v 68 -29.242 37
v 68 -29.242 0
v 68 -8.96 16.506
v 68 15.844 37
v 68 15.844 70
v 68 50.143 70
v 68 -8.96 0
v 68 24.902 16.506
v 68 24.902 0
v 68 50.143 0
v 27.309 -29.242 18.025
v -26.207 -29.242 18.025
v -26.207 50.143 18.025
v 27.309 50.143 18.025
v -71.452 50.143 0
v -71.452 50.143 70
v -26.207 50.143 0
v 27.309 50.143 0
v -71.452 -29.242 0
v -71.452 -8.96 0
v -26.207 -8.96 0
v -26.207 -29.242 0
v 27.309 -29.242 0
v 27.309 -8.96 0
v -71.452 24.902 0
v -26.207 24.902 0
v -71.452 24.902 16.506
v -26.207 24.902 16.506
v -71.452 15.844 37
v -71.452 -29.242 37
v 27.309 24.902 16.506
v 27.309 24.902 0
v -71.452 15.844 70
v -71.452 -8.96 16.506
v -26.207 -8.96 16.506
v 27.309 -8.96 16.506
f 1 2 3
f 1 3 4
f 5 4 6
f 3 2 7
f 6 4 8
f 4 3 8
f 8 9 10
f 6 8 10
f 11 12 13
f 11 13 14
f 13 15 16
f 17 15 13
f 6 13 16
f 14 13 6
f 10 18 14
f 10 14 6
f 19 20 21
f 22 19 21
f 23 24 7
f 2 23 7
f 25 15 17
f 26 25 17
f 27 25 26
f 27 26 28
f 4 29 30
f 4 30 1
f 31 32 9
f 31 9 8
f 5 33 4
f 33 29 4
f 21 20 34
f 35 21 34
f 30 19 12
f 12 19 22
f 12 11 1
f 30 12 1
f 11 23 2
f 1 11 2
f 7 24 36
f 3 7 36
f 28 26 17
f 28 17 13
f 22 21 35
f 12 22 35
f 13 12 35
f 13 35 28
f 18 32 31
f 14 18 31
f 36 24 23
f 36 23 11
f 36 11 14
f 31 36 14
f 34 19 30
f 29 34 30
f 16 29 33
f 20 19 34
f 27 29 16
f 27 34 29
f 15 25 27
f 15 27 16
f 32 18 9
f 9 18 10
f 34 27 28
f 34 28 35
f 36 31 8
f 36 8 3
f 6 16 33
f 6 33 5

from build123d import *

# Parameters (mm, degrees)
F0_W      = 139.4520141184
F0_H      = 104.3851450086
F1_DEPTH  = 10
F2_W      = 139.4520141184
F2_H      = 34.2989321798
F3_DEPTH  = 50
F4_DEPTH  = 27
F5_DEPTH  = 10
F6_DEPTH  = 25
F7_W      = 53.5153914243
F7_H      = 18.0249847472
F8_DEPTH  = 81
F9_W      = 33.8615532964
F9_H      = 16.5060851723
F10_DEPTH = 258


with BuildPart() as f1:
    # F0 (on Top) → F1 (new body)
    with BuildSketch(Plane.XY):
        with Locations((-1.7260108143, -2.0494647324)):
            Rectangle(F0_W, F0_H)
    extrude(amount=F1_DEPTH)

    # F2 (on face) → F3 (join)
    with BuildSketch(Plane.XY.offset(10)):
        with Locations((-1.7260108143, 32.993641682)):
            Rectangle(F2_W, F2_H)
    extrude(amount=F3_DEPTH)

    # F4 (add): a face of the model
    f4_faces = [f1.faces().sort_by_distance(p)[0] for p in [
        (-1.7260108143, -19.1989308223, 10),
    ]]
    extrude(f4_faces, amount=F4_DEPTH)

    # F5 (add): a face of the model
    f5_faces = [f1.faces().sort_by_distance(p)[0] for p in [
        (-1.7260108143, 32.993641682, 60),
    ]]
    extrude(f5_faces, amount=F5_DEPTH)

    # F6 (cut): a face of the model
    f6_faces = [f1.faces().sort_by_distance(p)[0] for p in [
        (-1.7260108143, -54.2420372367, 18.5),
    ]]
    extrude(f6_faces, amount=-F6_DEPTH, mode=Mode.SUBTRACT)

    # F7 (on face) → F8 (cut)
    with BuildSketch(Plane.XZ.offset(29.2420372367)):
        with Locations((0.5511036143, 9.0124923736)):
            Rectangle(F7_W, F7_H)
    extrude(amount=-F8_DEPTH, mode=Mode.SUBTRACT)

    # F9 (on face) → F10 (cut)
    with BuildSketch(Plane(origin=(-71.4520178735, 0, 0), x_dir=(0, -1, 0), z_dir=(-1, 0, 0))):
        with Locations((-7.9709040001, 8.2530425861)):
            Rectangle(F9_W, F9_H)
    extrude(amount=-F10_DEPTH, mode=Mode.SUBTRACT)


solid = f1.part
